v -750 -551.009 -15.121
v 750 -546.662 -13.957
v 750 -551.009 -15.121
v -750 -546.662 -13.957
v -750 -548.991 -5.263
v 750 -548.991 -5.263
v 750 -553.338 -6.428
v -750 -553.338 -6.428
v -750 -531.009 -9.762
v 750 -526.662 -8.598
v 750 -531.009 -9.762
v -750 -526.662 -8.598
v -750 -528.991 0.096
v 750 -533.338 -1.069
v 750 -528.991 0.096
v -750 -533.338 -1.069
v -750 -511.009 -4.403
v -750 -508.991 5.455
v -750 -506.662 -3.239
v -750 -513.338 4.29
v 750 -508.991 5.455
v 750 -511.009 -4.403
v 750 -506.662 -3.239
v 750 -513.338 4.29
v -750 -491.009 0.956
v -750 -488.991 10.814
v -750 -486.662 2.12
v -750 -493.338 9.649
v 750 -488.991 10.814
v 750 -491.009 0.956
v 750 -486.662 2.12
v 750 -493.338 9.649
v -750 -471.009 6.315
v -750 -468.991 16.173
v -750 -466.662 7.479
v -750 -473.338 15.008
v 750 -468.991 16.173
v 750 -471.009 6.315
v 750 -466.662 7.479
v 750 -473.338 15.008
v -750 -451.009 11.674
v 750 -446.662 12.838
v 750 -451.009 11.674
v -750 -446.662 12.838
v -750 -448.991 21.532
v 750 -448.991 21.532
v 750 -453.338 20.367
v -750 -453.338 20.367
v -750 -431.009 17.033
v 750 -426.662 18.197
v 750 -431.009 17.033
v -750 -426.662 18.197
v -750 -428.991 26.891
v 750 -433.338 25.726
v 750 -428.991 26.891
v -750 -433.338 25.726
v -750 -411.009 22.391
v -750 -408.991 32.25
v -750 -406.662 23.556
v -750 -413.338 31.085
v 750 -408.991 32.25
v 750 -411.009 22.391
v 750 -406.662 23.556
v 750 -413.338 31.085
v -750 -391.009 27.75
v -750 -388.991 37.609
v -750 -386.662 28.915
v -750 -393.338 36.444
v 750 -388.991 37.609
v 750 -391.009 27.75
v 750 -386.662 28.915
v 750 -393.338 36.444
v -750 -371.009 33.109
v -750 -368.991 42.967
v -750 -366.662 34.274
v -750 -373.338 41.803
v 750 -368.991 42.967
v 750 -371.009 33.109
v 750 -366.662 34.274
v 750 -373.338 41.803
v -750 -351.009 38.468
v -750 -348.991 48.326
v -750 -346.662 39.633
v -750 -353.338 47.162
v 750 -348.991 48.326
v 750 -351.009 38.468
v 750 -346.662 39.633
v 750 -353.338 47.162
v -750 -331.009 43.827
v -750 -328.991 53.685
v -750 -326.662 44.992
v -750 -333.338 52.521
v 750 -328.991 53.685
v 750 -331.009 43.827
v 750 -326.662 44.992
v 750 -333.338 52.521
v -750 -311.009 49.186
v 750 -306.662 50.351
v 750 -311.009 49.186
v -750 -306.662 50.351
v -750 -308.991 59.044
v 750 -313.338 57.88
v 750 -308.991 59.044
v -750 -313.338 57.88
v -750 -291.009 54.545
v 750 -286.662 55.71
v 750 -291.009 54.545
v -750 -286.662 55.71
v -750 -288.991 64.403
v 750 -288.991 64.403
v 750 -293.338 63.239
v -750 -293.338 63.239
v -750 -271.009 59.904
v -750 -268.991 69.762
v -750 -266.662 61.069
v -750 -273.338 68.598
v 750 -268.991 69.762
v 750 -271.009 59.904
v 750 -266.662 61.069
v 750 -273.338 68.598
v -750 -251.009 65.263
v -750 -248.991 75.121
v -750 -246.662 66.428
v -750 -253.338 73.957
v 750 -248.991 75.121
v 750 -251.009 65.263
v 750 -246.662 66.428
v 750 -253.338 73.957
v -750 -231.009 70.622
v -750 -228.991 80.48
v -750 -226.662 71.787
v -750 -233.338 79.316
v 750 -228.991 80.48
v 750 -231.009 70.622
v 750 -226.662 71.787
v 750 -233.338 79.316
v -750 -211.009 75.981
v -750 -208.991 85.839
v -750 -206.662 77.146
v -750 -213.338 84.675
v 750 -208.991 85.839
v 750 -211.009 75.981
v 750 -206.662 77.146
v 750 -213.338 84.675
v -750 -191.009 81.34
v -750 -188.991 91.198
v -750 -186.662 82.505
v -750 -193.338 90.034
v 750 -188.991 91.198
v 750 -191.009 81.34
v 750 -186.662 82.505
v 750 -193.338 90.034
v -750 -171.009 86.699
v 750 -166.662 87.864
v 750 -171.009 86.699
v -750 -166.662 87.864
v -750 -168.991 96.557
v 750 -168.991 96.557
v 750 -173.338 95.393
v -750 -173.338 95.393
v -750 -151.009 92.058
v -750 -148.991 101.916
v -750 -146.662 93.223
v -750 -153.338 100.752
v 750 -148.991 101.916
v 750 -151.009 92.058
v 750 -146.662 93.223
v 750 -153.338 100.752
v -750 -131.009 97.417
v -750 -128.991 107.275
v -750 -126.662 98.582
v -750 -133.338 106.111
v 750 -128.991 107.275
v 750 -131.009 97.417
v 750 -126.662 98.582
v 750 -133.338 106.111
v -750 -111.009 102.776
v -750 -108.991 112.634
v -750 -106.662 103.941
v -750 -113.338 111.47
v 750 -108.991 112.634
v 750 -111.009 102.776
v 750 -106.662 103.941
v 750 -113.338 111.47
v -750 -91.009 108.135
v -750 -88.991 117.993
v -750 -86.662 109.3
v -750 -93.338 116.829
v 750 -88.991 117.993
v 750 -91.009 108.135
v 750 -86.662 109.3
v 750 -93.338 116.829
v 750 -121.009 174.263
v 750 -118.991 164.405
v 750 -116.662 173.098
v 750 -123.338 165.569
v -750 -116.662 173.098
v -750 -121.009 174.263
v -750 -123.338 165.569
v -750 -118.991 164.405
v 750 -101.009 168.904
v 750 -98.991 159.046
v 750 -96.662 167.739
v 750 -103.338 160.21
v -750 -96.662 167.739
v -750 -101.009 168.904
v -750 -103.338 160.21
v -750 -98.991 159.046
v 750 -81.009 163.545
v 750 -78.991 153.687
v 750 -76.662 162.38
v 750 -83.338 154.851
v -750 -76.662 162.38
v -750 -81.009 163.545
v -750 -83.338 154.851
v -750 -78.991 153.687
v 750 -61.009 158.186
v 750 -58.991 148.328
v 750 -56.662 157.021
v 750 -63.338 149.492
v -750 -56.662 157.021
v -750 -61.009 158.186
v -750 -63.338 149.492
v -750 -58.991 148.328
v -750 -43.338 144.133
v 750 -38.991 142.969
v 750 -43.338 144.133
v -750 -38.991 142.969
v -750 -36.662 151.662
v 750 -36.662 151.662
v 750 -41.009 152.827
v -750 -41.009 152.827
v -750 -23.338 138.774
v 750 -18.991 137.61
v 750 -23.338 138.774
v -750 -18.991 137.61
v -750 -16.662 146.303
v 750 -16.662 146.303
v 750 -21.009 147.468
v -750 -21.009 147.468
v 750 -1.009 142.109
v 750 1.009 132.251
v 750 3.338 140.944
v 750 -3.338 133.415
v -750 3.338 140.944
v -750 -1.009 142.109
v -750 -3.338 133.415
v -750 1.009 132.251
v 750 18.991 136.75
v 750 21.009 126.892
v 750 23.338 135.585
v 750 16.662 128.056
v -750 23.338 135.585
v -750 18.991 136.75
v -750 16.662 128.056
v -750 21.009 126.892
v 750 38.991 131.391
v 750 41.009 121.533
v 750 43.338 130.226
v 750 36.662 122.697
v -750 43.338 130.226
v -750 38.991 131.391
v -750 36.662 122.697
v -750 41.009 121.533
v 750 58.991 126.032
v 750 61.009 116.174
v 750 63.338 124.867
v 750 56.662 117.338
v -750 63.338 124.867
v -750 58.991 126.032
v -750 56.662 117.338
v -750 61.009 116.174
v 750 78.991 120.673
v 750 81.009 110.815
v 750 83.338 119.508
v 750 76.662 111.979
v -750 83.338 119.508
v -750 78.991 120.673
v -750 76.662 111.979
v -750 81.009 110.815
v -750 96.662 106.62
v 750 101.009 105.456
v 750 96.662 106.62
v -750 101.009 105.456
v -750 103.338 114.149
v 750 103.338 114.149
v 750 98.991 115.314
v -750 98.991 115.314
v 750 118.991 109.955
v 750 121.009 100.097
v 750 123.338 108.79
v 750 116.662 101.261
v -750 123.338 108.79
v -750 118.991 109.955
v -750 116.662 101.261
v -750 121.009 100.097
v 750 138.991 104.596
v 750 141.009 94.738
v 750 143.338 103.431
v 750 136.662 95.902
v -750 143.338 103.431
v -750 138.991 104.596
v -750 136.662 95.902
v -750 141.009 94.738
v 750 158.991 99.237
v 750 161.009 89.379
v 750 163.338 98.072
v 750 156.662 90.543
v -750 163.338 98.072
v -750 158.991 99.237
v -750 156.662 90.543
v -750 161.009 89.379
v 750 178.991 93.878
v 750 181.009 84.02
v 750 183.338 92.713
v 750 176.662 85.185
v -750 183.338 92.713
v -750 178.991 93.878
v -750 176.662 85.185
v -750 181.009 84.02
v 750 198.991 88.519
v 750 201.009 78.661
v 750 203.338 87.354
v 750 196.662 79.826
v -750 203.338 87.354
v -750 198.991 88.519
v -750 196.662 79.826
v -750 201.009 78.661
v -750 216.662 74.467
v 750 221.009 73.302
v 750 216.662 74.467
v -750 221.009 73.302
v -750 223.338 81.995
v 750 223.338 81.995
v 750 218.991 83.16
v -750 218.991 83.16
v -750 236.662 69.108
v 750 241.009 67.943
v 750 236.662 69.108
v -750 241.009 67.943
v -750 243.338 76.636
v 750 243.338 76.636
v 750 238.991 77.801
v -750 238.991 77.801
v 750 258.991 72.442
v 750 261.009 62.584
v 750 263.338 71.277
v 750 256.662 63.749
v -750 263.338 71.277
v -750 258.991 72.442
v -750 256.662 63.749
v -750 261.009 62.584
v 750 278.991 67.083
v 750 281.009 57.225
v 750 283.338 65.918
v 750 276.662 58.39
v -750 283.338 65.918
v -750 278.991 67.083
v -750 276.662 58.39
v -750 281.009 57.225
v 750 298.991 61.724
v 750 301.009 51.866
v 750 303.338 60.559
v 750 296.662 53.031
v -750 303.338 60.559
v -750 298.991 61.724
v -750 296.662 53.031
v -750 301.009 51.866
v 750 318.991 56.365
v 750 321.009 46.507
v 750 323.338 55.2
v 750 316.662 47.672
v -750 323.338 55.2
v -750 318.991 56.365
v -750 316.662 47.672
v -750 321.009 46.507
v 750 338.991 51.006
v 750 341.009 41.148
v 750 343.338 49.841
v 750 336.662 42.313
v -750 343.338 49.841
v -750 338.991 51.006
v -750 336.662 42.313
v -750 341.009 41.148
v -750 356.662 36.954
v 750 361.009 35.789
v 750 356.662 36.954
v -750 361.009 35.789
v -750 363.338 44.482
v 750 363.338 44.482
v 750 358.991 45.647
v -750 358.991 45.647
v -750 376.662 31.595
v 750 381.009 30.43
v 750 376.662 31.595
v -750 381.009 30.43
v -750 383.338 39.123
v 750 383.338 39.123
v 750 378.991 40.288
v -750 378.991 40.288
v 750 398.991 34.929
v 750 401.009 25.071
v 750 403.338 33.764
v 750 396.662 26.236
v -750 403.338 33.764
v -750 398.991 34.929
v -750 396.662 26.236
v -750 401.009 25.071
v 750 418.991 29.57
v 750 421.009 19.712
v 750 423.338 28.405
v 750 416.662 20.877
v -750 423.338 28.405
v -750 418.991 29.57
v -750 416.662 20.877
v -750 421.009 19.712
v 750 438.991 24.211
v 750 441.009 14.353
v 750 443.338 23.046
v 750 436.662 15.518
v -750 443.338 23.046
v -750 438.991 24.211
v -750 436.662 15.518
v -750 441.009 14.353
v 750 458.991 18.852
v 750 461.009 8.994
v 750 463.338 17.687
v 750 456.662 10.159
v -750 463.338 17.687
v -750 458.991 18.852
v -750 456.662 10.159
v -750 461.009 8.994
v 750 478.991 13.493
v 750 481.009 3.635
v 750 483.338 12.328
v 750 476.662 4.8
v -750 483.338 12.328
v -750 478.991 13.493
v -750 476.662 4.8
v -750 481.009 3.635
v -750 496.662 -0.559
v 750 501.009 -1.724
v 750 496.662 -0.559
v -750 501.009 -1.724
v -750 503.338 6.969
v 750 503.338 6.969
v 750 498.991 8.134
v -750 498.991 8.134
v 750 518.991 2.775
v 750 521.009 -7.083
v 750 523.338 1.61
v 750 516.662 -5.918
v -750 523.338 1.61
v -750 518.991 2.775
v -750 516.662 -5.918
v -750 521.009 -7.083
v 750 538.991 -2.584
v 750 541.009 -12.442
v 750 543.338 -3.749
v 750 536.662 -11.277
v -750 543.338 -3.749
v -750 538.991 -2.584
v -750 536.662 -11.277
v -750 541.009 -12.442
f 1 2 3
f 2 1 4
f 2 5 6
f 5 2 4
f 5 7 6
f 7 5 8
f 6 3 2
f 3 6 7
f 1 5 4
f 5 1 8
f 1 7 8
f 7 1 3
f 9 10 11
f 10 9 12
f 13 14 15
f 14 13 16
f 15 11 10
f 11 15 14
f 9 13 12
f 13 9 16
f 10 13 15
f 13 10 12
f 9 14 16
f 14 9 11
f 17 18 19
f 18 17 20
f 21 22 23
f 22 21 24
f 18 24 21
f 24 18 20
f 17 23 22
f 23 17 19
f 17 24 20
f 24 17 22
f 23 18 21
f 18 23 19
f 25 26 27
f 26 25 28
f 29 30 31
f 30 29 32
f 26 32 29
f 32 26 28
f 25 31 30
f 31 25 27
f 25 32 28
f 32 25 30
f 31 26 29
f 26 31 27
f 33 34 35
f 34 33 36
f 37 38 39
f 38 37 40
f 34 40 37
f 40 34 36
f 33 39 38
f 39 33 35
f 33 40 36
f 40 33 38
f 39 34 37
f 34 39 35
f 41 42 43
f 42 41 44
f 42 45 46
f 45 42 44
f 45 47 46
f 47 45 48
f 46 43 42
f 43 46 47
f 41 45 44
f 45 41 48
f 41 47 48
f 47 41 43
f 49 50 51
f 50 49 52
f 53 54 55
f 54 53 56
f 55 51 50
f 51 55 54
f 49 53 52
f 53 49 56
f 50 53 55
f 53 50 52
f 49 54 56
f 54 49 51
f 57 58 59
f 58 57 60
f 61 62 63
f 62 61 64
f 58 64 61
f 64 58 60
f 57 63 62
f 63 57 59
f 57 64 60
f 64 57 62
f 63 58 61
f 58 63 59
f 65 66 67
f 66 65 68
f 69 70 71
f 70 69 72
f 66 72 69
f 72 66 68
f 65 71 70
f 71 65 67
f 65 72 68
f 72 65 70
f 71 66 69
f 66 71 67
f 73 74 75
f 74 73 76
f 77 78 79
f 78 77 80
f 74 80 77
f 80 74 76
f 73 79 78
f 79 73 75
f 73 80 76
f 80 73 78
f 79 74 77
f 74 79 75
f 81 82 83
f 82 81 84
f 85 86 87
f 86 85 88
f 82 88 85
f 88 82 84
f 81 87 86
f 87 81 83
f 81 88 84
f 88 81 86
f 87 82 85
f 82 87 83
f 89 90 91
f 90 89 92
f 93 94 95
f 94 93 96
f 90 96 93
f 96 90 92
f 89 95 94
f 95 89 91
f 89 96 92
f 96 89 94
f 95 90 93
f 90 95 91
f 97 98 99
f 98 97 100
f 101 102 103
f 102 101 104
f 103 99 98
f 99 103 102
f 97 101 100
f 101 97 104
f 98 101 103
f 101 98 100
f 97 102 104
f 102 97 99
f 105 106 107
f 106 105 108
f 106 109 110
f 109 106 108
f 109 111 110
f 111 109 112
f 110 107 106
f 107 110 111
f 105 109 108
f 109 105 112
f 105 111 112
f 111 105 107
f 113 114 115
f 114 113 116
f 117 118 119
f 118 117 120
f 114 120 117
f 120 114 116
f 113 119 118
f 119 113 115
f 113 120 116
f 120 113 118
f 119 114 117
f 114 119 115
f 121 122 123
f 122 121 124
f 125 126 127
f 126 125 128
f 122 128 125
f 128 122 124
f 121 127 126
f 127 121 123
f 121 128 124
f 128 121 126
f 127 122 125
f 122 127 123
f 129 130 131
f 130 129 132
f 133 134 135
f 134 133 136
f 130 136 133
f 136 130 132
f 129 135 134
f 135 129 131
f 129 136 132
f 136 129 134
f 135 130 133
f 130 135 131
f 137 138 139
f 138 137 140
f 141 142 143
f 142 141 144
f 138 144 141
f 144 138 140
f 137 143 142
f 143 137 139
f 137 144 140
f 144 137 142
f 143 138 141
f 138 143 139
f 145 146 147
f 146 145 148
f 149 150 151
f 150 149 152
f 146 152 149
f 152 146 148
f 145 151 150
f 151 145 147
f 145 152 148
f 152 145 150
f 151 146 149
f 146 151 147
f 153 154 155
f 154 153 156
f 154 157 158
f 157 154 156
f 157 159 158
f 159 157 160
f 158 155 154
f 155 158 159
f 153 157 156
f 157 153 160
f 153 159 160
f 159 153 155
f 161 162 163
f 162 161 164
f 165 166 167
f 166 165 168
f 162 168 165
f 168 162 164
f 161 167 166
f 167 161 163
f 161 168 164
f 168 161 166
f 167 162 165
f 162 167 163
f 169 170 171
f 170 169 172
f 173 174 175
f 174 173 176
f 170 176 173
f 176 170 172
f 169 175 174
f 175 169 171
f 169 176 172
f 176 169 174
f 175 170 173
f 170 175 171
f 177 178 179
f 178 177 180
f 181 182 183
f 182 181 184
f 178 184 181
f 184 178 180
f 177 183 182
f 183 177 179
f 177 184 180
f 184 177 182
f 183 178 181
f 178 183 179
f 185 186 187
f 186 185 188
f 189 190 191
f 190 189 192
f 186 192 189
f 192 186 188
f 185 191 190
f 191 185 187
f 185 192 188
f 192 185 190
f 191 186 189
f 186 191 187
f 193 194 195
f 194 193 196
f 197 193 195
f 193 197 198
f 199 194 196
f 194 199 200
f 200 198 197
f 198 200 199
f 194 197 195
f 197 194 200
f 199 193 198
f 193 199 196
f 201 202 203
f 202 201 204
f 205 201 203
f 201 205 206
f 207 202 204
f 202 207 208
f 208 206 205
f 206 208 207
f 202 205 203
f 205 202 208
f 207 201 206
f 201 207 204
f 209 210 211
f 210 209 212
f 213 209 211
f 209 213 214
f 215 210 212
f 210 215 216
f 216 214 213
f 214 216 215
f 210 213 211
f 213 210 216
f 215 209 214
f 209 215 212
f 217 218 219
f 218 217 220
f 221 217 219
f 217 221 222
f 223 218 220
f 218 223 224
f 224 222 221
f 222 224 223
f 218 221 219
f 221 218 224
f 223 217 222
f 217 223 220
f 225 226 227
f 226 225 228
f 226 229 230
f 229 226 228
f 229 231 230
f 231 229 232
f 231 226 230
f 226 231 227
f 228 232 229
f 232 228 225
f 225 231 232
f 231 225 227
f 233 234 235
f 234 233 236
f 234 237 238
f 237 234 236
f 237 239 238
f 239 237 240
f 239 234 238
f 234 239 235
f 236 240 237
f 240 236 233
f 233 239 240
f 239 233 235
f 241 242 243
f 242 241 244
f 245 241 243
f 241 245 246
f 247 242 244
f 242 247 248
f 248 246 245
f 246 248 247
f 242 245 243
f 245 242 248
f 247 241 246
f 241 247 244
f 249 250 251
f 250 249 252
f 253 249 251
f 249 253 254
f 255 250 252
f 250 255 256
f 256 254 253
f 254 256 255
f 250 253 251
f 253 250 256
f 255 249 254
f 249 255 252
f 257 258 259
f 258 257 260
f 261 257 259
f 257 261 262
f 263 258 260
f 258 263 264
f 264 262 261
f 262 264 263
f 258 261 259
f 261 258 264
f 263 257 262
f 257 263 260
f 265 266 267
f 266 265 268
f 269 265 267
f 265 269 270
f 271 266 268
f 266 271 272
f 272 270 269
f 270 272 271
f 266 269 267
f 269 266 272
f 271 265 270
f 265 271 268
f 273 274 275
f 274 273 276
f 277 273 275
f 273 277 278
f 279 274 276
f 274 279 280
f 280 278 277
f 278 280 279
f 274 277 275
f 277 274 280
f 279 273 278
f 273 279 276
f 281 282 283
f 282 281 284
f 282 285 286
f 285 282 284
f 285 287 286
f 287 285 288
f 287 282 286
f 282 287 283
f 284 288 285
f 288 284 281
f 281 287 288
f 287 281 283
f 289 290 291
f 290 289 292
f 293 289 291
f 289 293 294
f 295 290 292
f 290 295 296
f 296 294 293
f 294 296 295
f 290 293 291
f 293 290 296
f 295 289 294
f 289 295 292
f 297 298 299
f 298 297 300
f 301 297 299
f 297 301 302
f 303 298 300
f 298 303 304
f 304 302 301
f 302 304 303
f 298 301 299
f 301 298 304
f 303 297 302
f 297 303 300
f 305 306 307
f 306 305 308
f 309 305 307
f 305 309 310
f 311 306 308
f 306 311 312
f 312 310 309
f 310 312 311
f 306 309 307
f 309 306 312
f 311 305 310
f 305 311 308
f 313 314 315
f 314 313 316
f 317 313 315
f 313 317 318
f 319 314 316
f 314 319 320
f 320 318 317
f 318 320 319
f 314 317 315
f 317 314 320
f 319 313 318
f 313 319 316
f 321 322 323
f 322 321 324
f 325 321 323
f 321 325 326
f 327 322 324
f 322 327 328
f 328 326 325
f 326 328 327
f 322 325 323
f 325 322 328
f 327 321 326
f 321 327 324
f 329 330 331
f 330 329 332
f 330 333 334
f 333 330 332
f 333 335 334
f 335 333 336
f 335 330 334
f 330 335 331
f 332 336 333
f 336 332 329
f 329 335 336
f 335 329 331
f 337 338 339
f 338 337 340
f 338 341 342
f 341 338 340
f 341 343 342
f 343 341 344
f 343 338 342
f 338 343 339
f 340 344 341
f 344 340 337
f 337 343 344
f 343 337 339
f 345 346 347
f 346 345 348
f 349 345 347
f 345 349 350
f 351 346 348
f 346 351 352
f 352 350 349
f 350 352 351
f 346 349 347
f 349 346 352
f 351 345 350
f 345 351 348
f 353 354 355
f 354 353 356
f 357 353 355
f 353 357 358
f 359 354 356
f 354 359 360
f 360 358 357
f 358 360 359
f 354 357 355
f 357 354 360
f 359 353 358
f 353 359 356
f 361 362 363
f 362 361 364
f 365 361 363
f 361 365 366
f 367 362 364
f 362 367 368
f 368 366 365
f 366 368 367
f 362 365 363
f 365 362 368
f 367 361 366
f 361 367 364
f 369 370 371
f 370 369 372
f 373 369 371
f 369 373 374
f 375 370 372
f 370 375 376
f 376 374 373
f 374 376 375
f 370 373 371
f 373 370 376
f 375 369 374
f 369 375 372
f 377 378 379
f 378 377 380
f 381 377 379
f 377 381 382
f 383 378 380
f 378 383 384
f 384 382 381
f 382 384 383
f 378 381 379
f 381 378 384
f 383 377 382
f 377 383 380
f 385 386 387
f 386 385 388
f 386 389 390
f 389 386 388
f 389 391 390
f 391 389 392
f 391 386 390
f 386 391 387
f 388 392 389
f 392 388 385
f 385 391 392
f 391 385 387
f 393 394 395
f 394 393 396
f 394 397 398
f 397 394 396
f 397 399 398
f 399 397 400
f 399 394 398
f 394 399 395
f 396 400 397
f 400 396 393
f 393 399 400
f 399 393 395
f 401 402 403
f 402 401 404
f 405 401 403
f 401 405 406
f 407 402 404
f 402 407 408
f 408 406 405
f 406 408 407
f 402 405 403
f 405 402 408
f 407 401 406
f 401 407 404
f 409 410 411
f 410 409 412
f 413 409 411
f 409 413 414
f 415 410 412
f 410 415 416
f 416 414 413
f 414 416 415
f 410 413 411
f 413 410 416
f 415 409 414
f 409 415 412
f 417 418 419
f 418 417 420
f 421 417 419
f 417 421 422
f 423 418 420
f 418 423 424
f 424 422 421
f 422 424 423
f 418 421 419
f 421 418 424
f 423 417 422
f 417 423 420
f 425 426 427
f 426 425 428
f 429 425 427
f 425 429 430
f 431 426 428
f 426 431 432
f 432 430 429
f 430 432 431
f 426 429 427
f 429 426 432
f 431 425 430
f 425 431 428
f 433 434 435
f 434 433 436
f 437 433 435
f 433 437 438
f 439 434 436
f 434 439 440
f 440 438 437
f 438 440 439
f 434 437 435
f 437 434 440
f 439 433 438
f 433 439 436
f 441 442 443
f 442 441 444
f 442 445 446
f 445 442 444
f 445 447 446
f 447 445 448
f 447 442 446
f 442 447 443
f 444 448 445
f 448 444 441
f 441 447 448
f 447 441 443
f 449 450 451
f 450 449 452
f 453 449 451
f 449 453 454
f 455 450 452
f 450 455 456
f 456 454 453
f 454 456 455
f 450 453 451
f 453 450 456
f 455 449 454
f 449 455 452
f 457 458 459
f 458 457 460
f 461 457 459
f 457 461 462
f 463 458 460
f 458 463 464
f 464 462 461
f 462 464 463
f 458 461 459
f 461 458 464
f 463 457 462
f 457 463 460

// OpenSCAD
module houseroof(width=800, length=1200) {
beam_height = 9;
beam_width = 4.5;  
roof_angle = 15;
front_lip = 150;
back_lip = 150;
side_lip = 150;
air_gap = 30;
    
beam_length = length + front_lip + back_lip;

for (pos = [-width/2-side_lip:20:-80 /* width/2 */]) {
  translate([(front_lip-back_lip)/2, pos, (pos+width/2)*tan(roof_angle)+air_gap]) rotate([roof_angle,0, 0]) cube([beam_length,beam_width,beam_height],center=true);
}

for (pos = [-120/*-width/2*/:20:width/2+side_lip]) {
  translate([(front_lip-back_lip)/2, pos, (pos-width/2)*tan(-roof_angle)+air_gap]) rotate([-roof_angle,0, 0]) cube([beam_length,beam_width,beam_height],center=true);
}
}

houseroof();
